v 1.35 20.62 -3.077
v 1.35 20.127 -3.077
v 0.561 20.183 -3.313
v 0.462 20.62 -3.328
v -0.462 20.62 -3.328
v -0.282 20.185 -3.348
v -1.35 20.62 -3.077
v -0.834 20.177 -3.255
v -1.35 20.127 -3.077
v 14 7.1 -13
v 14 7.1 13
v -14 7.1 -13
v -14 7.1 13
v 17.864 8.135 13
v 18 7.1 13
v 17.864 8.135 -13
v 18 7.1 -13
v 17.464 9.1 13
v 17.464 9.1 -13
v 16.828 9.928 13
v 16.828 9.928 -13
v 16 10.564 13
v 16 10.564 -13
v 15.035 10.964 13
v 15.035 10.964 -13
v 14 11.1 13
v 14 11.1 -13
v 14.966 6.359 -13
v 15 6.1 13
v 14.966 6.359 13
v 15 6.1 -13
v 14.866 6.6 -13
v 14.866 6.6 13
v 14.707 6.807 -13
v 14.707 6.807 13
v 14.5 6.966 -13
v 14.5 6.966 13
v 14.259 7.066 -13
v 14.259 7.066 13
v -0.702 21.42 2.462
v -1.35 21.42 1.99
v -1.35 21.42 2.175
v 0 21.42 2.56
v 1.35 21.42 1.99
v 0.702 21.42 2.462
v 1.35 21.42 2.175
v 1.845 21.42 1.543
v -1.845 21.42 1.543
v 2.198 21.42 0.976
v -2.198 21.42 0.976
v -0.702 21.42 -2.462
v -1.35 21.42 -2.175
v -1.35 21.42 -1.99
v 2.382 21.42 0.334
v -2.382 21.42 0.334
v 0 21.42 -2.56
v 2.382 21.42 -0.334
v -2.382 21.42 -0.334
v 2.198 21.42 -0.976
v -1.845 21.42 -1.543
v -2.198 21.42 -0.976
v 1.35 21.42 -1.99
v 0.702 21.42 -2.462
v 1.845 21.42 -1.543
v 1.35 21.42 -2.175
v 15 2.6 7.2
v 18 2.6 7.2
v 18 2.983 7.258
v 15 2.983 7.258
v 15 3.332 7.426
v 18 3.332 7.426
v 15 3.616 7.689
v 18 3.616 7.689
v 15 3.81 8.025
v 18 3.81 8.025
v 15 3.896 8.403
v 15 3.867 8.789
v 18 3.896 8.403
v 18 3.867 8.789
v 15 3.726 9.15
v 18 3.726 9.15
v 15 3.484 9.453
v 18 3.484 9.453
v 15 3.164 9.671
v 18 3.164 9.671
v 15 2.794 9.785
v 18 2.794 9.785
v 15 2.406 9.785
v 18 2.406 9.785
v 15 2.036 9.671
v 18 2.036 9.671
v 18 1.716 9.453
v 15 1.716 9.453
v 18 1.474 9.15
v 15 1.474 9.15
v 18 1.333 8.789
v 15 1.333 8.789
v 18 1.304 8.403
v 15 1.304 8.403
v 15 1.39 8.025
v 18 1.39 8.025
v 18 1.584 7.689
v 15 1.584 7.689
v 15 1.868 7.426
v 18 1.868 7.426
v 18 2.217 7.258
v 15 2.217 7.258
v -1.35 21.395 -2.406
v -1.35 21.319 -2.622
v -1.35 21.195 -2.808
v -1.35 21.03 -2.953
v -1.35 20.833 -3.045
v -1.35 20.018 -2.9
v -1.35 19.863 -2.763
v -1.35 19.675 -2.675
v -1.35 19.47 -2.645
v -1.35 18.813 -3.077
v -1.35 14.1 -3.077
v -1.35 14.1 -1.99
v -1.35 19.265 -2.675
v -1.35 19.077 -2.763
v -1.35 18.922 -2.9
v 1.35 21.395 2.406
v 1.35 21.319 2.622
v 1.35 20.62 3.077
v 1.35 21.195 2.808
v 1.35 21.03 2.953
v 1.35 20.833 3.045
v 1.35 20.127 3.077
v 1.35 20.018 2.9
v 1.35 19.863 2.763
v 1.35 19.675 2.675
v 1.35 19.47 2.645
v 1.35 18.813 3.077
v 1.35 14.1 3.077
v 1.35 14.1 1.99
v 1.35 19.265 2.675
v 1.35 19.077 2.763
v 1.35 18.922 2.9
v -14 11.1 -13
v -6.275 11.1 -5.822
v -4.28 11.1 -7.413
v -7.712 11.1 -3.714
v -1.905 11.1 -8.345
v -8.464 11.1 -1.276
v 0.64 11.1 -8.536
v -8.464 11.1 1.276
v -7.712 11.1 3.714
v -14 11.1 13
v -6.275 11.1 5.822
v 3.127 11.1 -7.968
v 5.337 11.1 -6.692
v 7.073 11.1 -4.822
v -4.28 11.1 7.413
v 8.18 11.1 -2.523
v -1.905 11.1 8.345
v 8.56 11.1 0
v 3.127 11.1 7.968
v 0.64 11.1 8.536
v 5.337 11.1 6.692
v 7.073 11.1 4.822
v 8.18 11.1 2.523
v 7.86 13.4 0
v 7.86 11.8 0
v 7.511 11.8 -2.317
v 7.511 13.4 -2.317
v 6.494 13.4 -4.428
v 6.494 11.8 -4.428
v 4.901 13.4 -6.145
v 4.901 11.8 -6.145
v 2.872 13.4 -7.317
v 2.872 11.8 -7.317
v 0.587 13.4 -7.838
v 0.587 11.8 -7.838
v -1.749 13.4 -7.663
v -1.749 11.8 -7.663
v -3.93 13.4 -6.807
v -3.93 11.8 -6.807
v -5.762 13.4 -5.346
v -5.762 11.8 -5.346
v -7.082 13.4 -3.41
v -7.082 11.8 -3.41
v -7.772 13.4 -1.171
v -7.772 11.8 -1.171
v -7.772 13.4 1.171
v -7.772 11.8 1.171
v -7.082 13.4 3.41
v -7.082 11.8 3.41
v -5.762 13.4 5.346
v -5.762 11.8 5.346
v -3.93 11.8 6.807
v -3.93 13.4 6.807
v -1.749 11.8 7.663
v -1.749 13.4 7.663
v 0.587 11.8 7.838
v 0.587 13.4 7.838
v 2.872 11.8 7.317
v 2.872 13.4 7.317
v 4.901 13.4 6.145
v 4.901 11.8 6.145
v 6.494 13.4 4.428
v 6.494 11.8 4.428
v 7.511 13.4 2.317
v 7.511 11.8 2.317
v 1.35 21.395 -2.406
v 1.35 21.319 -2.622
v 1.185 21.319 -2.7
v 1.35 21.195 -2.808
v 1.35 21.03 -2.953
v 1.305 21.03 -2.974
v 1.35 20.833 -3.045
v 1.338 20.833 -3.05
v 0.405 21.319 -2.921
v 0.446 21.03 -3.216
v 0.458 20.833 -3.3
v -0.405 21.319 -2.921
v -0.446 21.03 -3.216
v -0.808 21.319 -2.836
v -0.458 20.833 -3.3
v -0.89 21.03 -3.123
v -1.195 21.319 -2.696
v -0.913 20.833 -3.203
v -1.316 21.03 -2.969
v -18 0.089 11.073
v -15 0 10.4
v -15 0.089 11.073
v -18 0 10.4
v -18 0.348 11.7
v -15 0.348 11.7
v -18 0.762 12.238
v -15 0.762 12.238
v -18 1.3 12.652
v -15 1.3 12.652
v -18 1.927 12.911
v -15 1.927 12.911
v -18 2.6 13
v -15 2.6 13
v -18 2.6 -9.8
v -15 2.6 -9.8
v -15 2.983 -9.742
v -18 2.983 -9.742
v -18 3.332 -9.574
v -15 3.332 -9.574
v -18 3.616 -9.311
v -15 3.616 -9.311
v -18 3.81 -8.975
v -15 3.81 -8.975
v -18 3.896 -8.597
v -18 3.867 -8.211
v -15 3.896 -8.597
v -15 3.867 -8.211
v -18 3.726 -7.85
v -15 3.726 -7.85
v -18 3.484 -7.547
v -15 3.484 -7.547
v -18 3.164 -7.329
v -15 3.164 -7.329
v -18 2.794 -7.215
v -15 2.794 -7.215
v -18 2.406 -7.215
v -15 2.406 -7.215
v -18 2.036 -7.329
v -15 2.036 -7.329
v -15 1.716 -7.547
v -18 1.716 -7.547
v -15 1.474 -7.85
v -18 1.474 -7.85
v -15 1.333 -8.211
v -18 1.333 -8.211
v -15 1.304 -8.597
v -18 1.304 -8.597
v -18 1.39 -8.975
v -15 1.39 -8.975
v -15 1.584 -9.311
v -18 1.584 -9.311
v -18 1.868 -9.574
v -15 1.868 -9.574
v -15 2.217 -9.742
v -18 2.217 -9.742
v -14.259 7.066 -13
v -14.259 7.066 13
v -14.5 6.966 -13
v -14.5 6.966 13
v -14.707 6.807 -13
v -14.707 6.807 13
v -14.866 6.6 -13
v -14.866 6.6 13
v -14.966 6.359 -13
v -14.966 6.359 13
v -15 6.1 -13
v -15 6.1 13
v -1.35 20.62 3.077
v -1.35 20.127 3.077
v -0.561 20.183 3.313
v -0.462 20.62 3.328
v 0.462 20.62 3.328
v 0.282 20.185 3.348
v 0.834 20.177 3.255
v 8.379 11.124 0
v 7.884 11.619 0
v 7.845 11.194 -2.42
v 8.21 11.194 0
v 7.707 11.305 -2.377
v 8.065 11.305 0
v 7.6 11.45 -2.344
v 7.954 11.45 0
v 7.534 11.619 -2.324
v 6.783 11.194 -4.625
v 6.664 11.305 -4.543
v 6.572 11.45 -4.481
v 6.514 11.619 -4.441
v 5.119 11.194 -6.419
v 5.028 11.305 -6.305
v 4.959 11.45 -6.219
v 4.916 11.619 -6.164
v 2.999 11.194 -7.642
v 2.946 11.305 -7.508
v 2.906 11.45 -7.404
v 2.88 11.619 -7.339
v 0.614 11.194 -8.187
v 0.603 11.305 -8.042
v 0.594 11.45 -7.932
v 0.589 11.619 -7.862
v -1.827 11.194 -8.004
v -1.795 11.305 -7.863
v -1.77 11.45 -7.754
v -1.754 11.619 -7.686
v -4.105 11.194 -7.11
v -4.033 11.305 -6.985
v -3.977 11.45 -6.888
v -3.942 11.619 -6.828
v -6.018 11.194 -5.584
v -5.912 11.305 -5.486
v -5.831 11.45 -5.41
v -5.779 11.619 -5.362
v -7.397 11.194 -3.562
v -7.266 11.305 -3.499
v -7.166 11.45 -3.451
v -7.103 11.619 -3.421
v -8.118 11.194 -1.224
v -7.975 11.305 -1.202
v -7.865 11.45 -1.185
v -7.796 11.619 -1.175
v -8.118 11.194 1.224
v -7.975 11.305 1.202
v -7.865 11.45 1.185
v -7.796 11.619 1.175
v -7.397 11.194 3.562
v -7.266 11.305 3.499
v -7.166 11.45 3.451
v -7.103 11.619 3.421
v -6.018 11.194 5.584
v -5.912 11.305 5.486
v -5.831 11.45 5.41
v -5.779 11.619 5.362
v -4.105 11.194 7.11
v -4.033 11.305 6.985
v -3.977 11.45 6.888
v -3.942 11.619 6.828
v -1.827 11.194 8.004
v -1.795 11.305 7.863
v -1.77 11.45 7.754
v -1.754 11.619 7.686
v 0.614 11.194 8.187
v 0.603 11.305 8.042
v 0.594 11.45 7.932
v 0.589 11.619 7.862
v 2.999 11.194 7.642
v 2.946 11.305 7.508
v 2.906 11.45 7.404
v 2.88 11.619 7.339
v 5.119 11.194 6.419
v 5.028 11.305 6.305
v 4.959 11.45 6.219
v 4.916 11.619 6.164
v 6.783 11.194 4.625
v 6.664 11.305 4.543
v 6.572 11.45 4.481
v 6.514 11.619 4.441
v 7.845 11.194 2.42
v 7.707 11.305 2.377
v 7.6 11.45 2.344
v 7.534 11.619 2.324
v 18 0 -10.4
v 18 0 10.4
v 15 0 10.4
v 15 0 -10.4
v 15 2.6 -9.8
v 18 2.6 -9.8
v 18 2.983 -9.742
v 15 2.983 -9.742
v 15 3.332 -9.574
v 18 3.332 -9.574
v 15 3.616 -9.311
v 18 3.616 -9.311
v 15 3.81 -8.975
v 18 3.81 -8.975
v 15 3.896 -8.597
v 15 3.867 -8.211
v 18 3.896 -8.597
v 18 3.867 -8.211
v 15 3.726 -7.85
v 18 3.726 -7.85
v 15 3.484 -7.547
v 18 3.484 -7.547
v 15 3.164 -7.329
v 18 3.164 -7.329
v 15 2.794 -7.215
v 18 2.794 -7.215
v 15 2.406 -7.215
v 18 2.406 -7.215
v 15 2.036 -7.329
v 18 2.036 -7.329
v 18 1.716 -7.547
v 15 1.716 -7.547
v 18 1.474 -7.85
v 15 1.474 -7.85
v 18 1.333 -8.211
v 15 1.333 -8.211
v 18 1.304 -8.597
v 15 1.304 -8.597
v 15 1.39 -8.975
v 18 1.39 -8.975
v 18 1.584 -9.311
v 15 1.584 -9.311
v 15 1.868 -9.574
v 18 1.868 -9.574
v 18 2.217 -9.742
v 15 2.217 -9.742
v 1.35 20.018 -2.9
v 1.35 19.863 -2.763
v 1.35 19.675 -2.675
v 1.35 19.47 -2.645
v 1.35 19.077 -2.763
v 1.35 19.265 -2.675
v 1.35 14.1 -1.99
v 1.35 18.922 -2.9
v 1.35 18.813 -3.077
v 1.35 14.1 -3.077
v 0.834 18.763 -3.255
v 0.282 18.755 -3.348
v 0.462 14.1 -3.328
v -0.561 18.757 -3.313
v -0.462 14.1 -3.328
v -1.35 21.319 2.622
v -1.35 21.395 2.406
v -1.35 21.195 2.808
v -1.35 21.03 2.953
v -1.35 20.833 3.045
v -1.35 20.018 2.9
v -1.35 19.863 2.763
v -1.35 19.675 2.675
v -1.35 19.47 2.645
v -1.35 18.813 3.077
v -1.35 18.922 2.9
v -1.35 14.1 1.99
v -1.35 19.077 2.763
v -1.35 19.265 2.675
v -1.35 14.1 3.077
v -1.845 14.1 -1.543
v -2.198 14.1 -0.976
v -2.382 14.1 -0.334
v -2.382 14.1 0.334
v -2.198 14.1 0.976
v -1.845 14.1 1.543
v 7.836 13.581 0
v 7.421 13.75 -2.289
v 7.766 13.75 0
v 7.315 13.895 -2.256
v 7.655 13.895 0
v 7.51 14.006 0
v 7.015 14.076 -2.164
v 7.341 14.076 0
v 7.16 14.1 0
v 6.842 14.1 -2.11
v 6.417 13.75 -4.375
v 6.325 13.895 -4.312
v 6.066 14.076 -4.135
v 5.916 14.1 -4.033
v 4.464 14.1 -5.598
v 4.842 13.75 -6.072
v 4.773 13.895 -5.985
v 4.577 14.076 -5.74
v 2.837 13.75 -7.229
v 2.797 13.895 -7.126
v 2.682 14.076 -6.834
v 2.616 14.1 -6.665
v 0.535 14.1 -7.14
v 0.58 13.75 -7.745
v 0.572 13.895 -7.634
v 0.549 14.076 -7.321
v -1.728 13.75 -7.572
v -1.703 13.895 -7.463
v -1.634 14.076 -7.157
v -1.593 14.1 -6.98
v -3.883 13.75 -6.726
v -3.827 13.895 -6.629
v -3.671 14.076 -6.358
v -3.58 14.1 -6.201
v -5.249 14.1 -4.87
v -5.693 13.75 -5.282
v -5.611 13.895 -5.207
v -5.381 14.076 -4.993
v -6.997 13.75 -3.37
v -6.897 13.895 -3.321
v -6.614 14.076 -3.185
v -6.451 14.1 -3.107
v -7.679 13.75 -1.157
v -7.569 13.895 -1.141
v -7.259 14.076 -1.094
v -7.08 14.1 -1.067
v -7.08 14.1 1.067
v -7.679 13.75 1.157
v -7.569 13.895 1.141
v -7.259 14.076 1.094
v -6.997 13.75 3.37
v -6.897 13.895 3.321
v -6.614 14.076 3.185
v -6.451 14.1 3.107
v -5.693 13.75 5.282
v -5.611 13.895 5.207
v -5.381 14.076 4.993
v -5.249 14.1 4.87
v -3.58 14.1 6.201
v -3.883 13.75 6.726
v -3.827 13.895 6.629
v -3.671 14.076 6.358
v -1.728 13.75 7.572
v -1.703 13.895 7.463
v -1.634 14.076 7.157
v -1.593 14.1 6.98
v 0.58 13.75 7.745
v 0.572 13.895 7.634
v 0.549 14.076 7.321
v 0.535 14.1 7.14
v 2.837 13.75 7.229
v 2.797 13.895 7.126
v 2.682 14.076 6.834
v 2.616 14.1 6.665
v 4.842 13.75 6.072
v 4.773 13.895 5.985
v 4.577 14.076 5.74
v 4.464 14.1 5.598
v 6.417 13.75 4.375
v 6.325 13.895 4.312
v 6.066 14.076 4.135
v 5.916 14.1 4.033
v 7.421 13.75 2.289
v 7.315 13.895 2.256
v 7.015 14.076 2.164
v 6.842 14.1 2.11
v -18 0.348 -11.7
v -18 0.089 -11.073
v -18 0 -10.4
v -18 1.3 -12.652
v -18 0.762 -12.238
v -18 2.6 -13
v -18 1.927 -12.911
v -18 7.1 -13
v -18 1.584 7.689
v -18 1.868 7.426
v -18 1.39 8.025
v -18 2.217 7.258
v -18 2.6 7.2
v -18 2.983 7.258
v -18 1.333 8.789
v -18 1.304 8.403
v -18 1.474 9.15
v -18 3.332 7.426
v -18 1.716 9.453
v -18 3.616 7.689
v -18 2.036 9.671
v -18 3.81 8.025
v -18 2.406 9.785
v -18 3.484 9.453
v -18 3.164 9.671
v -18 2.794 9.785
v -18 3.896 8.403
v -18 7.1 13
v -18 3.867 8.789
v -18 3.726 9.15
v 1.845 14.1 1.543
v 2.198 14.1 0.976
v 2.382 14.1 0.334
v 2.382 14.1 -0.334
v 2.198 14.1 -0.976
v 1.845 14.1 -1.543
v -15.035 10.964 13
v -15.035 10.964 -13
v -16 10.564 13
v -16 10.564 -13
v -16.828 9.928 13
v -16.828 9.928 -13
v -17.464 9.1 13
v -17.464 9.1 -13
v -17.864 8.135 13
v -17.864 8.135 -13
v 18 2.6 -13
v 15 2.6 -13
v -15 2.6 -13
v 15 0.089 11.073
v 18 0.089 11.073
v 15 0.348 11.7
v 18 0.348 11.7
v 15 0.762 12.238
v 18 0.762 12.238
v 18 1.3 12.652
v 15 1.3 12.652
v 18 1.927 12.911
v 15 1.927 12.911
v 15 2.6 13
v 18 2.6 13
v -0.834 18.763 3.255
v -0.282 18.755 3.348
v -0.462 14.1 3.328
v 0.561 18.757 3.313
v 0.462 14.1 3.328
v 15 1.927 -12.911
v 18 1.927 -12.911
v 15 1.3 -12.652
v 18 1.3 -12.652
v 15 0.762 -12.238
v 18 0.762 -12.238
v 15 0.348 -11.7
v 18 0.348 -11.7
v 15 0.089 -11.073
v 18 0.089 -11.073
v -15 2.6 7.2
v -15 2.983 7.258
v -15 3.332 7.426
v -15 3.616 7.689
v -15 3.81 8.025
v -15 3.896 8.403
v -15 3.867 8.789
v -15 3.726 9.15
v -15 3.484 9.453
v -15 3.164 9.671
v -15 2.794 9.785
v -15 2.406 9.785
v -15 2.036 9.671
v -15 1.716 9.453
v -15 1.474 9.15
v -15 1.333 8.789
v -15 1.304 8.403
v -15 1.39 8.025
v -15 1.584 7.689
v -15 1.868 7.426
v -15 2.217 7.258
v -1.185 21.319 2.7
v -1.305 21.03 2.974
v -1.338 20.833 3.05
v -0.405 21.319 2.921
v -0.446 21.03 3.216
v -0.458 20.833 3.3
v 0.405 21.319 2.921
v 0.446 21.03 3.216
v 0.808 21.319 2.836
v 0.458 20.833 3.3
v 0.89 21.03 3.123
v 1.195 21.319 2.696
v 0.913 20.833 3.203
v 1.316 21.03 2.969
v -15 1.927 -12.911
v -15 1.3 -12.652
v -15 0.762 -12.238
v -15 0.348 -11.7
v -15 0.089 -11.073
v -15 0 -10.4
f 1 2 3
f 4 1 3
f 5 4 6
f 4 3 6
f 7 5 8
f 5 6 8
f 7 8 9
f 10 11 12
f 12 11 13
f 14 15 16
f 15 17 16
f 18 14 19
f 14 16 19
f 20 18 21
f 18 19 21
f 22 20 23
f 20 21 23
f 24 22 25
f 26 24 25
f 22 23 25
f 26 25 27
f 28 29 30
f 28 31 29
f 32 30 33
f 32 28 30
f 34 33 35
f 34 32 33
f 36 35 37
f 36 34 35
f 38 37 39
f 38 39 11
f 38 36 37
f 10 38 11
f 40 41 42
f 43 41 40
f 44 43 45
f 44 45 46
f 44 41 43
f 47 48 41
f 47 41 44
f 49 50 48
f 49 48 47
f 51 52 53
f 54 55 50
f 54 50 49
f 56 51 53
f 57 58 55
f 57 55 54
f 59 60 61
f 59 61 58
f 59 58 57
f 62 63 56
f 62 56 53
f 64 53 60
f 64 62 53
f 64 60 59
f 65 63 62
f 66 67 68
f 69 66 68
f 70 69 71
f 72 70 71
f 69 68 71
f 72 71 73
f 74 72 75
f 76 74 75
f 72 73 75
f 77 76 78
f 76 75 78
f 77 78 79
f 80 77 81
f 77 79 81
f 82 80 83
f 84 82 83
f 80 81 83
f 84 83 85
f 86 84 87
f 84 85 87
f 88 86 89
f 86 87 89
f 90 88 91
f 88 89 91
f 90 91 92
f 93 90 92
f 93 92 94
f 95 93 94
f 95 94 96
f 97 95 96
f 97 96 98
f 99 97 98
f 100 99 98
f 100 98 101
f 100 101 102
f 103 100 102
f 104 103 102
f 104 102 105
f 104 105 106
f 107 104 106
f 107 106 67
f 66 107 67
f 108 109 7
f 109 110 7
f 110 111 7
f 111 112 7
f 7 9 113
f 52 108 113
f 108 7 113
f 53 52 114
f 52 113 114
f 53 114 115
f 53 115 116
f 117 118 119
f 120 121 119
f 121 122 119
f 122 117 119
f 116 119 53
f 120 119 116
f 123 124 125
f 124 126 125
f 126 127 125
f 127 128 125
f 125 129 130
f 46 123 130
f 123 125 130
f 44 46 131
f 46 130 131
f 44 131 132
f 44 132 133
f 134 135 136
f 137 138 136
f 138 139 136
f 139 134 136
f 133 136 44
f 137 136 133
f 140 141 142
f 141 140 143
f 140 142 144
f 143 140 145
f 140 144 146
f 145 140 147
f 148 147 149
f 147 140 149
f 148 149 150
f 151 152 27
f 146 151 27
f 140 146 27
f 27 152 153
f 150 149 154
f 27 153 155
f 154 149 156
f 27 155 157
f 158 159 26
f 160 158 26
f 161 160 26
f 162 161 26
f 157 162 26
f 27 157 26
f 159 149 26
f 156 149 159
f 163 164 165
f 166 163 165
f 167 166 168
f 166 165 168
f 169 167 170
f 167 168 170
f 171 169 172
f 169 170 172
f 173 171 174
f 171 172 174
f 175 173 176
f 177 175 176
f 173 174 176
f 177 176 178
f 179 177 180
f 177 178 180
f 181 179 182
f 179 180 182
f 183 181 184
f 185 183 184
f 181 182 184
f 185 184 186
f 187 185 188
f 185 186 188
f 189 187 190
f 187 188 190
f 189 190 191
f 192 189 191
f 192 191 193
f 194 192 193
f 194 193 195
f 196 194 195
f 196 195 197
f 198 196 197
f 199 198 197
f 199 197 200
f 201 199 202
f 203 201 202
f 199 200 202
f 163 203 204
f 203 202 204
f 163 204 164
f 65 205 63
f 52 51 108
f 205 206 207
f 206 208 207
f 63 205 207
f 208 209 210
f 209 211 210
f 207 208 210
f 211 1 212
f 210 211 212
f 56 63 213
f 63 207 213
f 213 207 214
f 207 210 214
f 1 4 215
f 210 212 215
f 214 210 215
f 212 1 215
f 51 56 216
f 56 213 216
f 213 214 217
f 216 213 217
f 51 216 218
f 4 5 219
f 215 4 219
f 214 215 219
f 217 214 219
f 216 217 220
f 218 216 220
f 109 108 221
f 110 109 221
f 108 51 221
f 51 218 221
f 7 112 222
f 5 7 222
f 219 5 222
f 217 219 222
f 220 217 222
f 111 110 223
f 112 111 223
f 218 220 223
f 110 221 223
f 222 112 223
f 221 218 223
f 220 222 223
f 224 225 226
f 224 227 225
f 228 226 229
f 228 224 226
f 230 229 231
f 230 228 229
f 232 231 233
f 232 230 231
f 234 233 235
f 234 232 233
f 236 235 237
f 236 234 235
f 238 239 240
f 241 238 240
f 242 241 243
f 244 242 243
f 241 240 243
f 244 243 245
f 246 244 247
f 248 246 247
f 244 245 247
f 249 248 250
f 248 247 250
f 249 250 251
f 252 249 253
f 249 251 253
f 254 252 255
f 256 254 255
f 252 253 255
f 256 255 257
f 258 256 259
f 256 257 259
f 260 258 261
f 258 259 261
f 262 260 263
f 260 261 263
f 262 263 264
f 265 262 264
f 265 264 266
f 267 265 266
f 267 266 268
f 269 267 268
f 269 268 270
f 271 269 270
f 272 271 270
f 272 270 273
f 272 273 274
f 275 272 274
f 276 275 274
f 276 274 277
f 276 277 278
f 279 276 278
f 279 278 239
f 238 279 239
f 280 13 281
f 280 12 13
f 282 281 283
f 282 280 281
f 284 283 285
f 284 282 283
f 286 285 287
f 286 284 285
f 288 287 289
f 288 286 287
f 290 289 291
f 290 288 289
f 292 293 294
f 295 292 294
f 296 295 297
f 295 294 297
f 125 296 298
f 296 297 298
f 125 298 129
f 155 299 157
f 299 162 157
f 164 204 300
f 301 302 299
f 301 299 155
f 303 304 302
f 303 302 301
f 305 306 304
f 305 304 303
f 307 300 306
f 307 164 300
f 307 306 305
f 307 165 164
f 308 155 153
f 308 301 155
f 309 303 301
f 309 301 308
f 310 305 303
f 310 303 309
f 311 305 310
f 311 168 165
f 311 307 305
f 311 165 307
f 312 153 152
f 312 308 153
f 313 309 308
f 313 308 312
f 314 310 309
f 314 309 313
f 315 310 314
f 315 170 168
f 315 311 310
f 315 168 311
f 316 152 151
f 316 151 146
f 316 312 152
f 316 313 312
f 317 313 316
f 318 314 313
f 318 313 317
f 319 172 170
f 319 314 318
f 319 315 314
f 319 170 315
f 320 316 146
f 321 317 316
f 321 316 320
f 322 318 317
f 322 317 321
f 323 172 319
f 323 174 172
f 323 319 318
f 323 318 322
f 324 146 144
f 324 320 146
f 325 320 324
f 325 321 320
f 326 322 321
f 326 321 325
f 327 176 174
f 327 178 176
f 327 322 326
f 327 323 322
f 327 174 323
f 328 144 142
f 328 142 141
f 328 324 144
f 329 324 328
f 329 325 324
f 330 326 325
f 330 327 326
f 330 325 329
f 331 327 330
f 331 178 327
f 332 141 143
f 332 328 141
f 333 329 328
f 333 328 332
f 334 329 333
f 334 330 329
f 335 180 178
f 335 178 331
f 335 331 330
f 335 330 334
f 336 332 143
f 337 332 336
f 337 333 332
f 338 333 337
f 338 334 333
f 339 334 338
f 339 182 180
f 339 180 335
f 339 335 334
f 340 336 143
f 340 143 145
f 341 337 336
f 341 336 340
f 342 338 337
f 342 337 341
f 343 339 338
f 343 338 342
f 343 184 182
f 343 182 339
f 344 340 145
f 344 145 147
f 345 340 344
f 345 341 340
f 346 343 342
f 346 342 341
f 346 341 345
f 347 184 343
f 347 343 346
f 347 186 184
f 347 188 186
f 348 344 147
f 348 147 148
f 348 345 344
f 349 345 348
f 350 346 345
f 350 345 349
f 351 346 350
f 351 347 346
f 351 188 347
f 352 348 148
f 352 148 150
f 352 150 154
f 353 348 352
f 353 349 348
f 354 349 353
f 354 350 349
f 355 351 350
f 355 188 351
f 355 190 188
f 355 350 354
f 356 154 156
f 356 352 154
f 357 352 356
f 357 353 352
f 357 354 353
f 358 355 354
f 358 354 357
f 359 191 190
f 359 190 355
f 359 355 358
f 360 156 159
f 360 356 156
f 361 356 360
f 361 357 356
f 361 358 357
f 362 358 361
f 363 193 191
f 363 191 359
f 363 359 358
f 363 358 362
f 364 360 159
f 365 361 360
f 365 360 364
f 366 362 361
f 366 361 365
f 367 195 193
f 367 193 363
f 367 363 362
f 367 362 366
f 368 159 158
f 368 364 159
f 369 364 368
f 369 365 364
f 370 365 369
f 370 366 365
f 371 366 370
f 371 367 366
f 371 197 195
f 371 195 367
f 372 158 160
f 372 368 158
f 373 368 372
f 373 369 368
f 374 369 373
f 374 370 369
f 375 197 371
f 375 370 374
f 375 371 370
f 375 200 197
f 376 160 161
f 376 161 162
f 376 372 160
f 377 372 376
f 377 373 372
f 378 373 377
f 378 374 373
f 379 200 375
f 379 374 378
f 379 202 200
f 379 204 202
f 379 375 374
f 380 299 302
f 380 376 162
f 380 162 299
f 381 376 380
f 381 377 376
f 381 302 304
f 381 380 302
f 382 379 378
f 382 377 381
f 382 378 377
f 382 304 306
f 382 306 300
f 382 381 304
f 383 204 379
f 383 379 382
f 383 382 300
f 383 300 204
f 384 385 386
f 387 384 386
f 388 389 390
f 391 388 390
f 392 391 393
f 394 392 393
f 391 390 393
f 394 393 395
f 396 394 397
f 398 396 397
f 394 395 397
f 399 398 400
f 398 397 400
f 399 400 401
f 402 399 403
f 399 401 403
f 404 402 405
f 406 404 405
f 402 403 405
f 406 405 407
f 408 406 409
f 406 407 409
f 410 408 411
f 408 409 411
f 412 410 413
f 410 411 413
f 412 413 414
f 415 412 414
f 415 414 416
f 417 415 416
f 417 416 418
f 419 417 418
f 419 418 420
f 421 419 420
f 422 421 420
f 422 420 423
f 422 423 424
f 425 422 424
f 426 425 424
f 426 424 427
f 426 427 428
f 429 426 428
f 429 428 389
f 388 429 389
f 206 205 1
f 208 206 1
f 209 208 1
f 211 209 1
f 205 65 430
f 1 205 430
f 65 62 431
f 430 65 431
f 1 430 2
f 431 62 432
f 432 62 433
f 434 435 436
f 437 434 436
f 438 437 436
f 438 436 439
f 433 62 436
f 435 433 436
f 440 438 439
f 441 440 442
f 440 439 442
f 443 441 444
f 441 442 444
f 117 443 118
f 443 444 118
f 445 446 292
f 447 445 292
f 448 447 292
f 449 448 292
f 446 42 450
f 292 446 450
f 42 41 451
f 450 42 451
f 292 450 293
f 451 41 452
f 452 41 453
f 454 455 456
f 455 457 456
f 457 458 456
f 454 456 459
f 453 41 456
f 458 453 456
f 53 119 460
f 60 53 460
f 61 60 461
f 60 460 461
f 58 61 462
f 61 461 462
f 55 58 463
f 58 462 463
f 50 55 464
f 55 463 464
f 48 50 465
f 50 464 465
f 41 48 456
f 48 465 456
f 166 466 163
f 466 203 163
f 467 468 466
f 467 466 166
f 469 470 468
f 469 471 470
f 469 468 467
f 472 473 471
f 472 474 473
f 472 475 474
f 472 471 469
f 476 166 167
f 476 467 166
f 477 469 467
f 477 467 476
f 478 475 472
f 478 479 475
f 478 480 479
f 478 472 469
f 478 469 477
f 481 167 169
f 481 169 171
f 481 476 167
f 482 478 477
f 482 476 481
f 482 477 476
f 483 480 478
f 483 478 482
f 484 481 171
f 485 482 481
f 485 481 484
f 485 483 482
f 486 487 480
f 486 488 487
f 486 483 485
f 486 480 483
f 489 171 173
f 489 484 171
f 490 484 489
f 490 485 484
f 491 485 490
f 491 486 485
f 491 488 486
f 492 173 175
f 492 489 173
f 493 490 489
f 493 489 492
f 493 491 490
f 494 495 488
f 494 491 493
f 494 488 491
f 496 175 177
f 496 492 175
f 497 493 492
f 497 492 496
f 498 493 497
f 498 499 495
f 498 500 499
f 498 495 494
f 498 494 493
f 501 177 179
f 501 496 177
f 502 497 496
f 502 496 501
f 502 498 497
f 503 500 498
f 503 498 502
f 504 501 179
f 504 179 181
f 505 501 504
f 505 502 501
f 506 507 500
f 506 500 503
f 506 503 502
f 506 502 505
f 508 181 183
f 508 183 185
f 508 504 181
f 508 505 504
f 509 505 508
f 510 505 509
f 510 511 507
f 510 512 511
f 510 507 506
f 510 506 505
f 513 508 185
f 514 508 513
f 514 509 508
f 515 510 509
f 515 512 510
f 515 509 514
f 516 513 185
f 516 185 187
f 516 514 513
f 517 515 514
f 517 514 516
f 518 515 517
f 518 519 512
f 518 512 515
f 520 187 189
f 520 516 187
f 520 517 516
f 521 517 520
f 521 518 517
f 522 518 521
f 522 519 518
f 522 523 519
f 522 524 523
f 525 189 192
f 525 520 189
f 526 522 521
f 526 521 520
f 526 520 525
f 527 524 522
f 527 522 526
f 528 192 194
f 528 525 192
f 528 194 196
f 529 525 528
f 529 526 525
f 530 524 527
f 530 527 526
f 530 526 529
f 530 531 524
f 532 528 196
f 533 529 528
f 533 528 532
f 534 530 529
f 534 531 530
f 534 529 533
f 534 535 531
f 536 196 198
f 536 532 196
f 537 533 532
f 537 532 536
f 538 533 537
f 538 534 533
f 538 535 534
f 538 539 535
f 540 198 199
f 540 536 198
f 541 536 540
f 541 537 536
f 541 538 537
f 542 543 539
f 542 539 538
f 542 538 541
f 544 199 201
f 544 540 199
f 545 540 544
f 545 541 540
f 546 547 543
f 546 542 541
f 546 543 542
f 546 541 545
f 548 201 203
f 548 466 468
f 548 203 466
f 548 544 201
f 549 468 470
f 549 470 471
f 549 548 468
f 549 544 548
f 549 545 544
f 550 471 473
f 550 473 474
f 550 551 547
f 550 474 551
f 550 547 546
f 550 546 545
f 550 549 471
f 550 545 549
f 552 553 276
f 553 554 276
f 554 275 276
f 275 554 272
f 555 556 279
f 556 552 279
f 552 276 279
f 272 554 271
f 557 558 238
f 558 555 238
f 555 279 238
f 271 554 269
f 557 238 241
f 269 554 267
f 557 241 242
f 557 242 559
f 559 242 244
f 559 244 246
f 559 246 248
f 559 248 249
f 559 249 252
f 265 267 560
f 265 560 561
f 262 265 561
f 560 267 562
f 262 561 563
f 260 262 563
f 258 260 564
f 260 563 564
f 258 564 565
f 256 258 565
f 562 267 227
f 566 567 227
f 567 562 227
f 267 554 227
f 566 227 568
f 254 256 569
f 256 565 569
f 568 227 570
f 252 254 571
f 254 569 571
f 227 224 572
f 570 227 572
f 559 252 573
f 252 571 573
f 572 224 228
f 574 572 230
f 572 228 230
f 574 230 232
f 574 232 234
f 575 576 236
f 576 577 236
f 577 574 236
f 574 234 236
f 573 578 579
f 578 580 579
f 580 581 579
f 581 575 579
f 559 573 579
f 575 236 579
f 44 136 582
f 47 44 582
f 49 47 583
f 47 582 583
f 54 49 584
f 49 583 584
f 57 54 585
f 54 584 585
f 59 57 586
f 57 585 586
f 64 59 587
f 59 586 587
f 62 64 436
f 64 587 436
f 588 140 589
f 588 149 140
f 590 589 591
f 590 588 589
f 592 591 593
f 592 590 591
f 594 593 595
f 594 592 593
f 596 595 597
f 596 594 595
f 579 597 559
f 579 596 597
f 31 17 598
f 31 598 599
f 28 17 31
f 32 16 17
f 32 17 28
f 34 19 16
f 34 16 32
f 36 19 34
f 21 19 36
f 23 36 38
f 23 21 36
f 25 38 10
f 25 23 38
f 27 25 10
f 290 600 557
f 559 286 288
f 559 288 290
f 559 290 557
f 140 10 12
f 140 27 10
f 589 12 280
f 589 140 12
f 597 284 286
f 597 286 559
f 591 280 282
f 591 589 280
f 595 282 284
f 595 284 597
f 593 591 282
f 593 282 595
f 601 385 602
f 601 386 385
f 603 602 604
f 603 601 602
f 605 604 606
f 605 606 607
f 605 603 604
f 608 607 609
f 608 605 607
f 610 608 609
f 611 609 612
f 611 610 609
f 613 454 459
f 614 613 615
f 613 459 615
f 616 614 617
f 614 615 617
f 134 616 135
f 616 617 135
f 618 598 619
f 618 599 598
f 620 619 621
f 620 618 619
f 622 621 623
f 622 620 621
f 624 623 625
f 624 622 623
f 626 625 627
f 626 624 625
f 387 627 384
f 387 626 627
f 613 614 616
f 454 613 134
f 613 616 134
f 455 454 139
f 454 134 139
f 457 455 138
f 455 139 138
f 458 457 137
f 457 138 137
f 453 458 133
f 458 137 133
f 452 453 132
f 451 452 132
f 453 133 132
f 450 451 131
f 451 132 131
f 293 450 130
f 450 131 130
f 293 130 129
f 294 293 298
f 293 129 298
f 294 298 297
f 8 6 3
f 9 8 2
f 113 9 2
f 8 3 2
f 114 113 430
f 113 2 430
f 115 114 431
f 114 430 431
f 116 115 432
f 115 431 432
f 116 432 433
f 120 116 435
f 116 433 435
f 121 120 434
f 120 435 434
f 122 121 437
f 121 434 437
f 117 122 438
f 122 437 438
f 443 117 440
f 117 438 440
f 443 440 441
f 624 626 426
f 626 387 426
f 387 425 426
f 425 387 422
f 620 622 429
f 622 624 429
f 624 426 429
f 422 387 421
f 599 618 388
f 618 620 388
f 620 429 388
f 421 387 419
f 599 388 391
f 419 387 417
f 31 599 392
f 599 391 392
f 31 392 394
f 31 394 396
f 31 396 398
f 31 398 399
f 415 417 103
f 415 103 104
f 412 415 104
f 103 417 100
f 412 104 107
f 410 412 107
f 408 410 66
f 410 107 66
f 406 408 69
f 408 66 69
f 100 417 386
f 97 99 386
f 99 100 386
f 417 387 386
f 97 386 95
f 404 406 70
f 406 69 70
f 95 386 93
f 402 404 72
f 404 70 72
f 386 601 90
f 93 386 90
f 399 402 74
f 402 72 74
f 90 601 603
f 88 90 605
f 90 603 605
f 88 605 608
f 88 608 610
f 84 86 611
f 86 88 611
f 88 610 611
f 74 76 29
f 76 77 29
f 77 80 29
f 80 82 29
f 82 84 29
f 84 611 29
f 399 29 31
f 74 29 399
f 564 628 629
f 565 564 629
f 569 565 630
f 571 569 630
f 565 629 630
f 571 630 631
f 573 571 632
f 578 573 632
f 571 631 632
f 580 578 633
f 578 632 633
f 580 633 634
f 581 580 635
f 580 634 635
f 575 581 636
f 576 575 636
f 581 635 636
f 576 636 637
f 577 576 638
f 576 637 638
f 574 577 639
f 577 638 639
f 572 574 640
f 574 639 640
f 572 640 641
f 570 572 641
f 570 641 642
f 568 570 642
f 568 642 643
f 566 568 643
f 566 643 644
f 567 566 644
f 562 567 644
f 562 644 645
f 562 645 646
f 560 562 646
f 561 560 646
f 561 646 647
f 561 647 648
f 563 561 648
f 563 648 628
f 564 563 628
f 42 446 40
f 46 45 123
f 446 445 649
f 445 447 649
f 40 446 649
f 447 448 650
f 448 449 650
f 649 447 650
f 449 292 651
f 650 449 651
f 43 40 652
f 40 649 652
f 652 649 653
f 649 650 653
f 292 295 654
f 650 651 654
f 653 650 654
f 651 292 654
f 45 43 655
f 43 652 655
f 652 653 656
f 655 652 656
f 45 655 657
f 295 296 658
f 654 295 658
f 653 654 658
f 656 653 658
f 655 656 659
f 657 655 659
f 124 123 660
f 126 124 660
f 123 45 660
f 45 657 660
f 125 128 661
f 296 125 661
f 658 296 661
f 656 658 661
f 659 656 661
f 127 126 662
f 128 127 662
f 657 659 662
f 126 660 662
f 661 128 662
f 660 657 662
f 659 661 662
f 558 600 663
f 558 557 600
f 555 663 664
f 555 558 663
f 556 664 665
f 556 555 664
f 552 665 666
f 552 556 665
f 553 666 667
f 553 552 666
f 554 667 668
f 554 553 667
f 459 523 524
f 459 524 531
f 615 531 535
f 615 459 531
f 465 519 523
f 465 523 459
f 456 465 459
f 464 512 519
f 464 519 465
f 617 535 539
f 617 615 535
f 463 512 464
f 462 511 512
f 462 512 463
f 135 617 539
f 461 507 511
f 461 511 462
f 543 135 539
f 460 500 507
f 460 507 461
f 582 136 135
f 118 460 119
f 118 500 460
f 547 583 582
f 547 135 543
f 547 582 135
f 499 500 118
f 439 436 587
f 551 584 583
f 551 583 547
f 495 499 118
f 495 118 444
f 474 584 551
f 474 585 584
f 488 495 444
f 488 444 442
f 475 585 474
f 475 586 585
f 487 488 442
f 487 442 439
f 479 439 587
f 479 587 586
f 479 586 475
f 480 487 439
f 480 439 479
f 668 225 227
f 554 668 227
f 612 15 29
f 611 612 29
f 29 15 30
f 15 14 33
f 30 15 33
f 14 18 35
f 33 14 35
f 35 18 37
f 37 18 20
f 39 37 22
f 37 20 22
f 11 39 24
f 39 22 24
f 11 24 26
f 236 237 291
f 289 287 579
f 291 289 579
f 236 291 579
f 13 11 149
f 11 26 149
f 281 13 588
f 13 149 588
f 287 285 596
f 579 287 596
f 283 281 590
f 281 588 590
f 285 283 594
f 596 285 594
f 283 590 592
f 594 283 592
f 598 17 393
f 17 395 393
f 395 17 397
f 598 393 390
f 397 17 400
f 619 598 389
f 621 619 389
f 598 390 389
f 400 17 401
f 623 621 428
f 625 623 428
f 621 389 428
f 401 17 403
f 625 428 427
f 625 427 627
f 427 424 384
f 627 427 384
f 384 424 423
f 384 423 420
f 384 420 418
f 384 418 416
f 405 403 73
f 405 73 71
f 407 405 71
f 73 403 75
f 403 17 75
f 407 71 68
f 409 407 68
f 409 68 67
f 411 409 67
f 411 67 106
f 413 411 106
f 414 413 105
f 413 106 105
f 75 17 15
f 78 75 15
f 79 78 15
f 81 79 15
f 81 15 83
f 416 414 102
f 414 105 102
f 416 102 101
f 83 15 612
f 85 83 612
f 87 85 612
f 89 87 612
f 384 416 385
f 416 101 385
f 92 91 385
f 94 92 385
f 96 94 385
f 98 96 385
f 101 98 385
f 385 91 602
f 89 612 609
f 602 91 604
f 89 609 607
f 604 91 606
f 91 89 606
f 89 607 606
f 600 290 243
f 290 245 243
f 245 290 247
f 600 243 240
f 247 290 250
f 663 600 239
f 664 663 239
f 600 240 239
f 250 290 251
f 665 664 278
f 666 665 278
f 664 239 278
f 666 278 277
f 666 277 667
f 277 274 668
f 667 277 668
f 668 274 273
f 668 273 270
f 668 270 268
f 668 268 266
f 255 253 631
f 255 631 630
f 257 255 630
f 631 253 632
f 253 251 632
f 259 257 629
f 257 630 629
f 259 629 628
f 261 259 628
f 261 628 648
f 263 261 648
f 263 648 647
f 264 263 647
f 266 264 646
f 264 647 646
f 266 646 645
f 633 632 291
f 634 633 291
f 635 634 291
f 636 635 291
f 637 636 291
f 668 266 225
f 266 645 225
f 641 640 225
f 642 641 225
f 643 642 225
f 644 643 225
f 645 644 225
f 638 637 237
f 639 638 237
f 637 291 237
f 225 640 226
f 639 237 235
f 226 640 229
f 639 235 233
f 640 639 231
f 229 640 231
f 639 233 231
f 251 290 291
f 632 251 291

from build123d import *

# Parameters (mm, degrees)
BOSS_EXTRUDE1_DEPTH = 13
SKETCH2_R           = 1.3
CUT_EXTRUDE1_DEPTH  = 37
FILLET1_R           = 1
FILLET2_R           = 2.6
FILLET3_R           = 4
SKETCH3_R           = 7.86
BOSS_EXTRUDE2_DEPTH = 3
FILLET4_R           = 0.7
BOSS_EXTRUDE3_DEPTH = 7.32
SKETCH6_R           = 0.715
CUT_EXTRUDE2_DEPTH  = 20.35
FILLET5_R           = 0.8


with BuildPart() as part:
    # Sketch1 → Boss-Extrude1 (new body, symmetric)
    with BuildSketch(Plane.XY):
        Polygon((-18, 11.1), (18, 11.1), (18, 0), (15, 0), (15, 7.1), (-15, 7.1), (-15, 0), (-18, 0), align=None)
    extrude(amount=BOSS_EXTRUDE1_DEPTH, both=True)

    # Sketch2 → Cut-Extrude1 (cut, through all)
    with BuildSketch(Plane(origin=(18, 0, 0), x_dir=(0, 0, -1), z_dir=(1, 0, 0))):
        with Locations((-8.5, 2.6)):
            Circle(SKETCH2_R)
        with Locations((8.5, 2.6)):
            Circle(SKETCH2_R)
    extrude(amount=-CUT_EXTRUDE1_DEPTH, mode=Mode.SUBTRACT)

    # Fillet1
    fillet1_edges = [part.edges().sort_by_distance(p)[0] for p in [
        (15, 7.1, 0),
        (-15, 7.1, 0),
    ]]
    fillet(fillet1_edges, radius=FILLET1_R)

    # Fillet2
    fillet2_edges = [part.edges().sort_by_distance(p)[0] for p in [
        (-16.5, 0, -13),
        (16.5, 0, 13),
        (-16.5, 0, 13),
        (16.5, 0, -13),
    ]]
    fillet(fillet2_edges, radius=FILLET2_R)

    # Fillet3
    fillet3_edges = [part.edges().sort_by_distance(p)[0] for p in [
        (-18, 11.1, 0),
        (18, 11.1, 0),
    ]]
    fillet(fillet3_edges, radius=FILLET3_R)

    # Sketch3 → Boss-Extrude2 (add)
    with BuildSketch(Plane(origin=(0, 11.1, 0), x_dir=(1, 0, 0), z_dir=(0, 1, 0))):
        Circle(SKETCH3_R)
    extrude(amount=BOSS_EXTRUDE2_DEPTH)

    # Fillet4
    fillet4_edges = [part.edges().sort_by_distance(p)[0] for p in [
        (-7.86, 11.1, 0),
        (-7.86, 14.1, 0),
    ]]
    fillet(fillet4_edges, radius=FILLET4_R)

    # Sketch5 → Boss-Extrude3 (add)
    with BuildSketch(Plane(origin=(0, 14.1, 0), x_dir=(1, 0, 0), z_dir=(0, 1, 0))):
        with BuildLine():
            Line((1.35, 1.990358008), (1.35, 3.076865288))
            ThreePointArc((1.35, 3.076865288), (0, 3.36), (-1.35, 3.076865288))
            Line((-1.35, 3.076865288), (-1.35, 1.990358008))
            ThreePointArc((-1.35, 1.990358008), (-2.405, 0), (-1.35, -1.990358008))
            Line((-1.35, -1.990358008), (-1.35, -3.076865288))
            ThreePointArc((-1.35, -3.076865288), (0, -3.36), (1.35, -3.076865288))
            Line((1.35, -3.076865288), (1.35, -1.990358008))
            ThreePointArc((1.35, -1.990358008), (2.405, 0), (1.35, 1.990358008))
        make_face()
    extrude(amount=BOSS_EXTRUDE3_DEPTH)

    # Sketch6 → Cut-Extrude2 (cut, through all)
    with BuildSketch(Plane(origin=(1.35, 0, 0), x_dir=(0, 0, -1), z_dir=(1, 0, 0))):
        with Locations((-3.36, 19.47)):
            Circle(SKETCH6_R)
        with Locations((3.36, 19.47)):
            Circle(SKETCH6_R)
    extrude(amount=-CUT_EXTRUDE2_DEPTH, mode=Mode.SUBTRACT)

    # Fillet5
    fillet5_edges = [part.edges().sort_by_distance(p)[0] for p in [
        (0, 21.42, 3.36),
        (0, 21.42, -3.36),
    ]]
    fillet(fillet5_edges, radius=FILLET5_R)


solid = part.part
